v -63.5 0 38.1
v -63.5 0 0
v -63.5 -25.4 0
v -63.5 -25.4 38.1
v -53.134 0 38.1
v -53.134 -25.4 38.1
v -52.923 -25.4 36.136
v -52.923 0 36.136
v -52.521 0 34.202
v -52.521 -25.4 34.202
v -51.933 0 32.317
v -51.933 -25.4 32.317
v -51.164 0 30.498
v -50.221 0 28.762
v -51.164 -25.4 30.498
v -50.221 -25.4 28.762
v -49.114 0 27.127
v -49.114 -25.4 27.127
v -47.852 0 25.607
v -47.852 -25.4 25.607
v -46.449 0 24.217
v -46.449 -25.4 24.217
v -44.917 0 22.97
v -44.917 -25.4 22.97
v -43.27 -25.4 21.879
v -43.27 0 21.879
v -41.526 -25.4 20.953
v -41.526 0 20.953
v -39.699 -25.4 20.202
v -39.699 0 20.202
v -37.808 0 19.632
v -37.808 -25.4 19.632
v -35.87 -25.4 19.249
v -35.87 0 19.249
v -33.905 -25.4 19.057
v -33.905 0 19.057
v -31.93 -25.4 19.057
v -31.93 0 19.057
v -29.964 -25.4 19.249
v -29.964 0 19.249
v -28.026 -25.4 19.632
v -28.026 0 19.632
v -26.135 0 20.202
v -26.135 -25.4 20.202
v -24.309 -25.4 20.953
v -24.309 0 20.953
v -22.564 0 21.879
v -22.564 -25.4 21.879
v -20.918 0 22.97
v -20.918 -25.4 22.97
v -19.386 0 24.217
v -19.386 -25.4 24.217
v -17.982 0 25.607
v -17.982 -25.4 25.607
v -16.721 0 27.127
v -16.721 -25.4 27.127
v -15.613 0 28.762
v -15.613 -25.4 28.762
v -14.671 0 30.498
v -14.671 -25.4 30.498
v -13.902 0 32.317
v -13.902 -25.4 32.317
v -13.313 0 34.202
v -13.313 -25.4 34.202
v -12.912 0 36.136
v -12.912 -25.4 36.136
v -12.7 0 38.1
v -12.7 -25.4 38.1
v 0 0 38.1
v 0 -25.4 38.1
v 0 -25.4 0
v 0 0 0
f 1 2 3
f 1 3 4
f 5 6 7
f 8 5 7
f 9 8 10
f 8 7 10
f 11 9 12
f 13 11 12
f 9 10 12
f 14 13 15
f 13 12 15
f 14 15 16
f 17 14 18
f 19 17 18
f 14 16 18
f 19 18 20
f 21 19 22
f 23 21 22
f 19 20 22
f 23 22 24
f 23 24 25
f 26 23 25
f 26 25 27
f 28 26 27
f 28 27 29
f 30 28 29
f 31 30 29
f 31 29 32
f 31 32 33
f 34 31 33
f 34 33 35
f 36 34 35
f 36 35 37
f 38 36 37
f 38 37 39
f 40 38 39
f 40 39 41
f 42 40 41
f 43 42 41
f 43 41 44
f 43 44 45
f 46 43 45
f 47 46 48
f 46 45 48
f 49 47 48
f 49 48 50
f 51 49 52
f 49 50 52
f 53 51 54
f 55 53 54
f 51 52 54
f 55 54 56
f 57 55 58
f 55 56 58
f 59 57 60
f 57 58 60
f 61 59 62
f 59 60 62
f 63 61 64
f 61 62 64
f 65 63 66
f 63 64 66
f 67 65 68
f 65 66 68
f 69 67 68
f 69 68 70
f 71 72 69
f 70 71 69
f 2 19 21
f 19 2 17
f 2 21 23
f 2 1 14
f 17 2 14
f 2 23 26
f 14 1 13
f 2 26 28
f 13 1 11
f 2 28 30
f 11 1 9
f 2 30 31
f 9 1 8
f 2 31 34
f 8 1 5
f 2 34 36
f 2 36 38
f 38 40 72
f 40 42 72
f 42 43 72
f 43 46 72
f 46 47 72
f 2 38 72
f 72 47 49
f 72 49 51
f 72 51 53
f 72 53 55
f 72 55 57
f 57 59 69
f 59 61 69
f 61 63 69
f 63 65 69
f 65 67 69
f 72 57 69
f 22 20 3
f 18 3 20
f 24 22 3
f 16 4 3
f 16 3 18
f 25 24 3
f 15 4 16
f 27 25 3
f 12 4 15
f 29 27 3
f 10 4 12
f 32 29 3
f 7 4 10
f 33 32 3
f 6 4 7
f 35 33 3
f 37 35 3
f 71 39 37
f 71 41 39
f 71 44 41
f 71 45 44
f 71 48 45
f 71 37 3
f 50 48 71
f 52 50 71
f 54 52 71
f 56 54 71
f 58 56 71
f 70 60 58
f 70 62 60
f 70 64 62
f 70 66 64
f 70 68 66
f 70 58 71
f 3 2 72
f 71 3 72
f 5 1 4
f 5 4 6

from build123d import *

# Parameters (mm, degrees)
F0_W     = 63.5
F0_H     = 38.1
F1_DEPTH = 25.4
F3_DEPTH = 25.401


with BuildPart() as f1:
    # F0 (on Front) → F1 (new body)
    with BuildSketch(Plane.XZ):
        with Locations((-31.75, 19.05)):
            Rectangle(F0_W, F0_H)
    extrude(amount=F1_DEPTH)

    # F2 (on face) → F3 (cut, through all)
    with BuildSketch(Plane.XZ.offset(25.4)):
        with BuildLine():
            Line((-12.7, 38.1), (-53.134321885, 38.1))
            ThreePointArc((-53.134321885, 38.1), (-32.9171609425, 19.0326653727), (-12.7, 38.1))
        make_face()
    extrude(amount=-F3_DEPTH, mode=Mode.SUBTRACT)


solid = f1.part
